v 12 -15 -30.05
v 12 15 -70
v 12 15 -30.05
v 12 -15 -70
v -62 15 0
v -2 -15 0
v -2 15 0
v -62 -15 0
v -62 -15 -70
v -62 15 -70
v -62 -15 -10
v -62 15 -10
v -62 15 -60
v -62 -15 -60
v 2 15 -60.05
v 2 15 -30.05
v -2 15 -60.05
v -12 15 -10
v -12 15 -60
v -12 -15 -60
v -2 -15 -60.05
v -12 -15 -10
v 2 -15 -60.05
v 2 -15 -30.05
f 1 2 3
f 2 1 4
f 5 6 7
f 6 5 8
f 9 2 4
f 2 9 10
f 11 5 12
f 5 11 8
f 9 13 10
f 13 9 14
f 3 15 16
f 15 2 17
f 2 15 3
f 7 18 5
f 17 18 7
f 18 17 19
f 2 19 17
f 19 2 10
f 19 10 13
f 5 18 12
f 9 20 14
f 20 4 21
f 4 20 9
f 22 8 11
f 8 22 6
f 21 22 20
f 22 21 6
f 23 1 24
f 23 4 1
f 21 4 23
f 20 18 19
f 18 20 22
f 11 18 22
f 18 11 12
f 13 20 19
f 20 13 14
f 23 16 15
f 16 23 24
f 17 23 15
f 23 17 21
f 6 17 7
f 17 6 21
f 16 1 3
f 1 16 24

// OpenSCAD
fragments = 300;
tol = 0.1;


// -------------------------------------------------------
// ----------------- Plexiglass holder - plant's cat guard
// -------------------------------------------------------
thickness_part = 10;
thickness_lack = 50;
thickness_plexiglass = 4;

let(){
    dx = 2 * thickness_part + thickness_lack + thickness_plexiglass;
    dy = 30; //(2 * thickness_part + thickness_lack) / 2;
    dz = 2 * thickness_part + thickness_lack;
    echo(dy);

    difference(){
        dist_end_to_plexiglas_center = -dx + thickness_part+thickness_plexiglass/2;
        translate([dist_end_to_plexiglas_center, 0, -dz/2])
        difference(){
            translate([dx/2, 0, 0])
            cube(size = [dx, dy, dz], center=true);
            cube(size = [2*thickness_lack, 2* thickness_lack, thickness_lack], center=true);
        }

        translate([0, 0, -(thickness_lack+thickness_part)/2])
        cube(size = [thickness_plexiglass, 2*thickness_lack, thickness_lack+thickness_part+tol], center=true);

        dist = (thickness_part+thickness_plexiglass)/2;
        translate([dist, 0, dz/2 - (dz-4*thickness_part)])
        cube(size = [thickness_part+tol, dy+tol, dz+tol], center=true);
    }
}


// // -------------------------------------------------------
// // ---------------------------- water transfer pipe holder
// // -------------------------------------------------------
// inner_diameter = 7;
// bend_radius = 10;
// bend_arc = 90;
// straight_length = 50;
// thickness = 2;

// module bend(){
//     difference(){
//         rotate_extrude(angle=bend_arc, convexity=10)
//         translate([bend_radius, 0, 0])
//         circle(r=(thickness+inner_diameter)/2, $fn=fragments);

//         rotate([0, 0, -1]) 
//         rotate_extrude(angle=bend_arc+2, convexity=10)
//         translate([bend_radius, 0, 0])
//         circle(r=inner_diameter/2, $fn=fragments);
//     }
// }
// module straight() {
//     difference(){
//         cylinder(h=straight_length, d=inner_diameter+thickness, center=true, $fn=fragments);
//         cylinder(h=straight_length+1, d=inner_diameter, center=true, $fn=fragments);

//     }    
// }

// difference(){
//     union() {
//         rotate([0, 90, 0])
//         straight();

//         translate([straight_length/2-tol, -bend_radius, 0])
//         rotate([0, 0, 90-bend_arc])
//         bend();

//         translate([-(straight_length/2-tol), -bend_radius, 0])
//         rotate([0, 0, 90])
//         bend();
//     }
//     cut_ratio = 1/5;
//     translate([0, 0, (2- cut_ratio)*inner_diameter/2])
//     cube([3*straight_length, 3*straight_length, inner_diameter], center=true);
// }

// translate([0, 0, 20]) 
// let(h = 2*thickness,
//     inner_d = inner_diameter-1,
//     outer_d = 3*inner_diameter)
// {
//     difference(){
//         cylinder(h =h, d=outer_d, $fn=fragments, center=true);
//         cylinder(h =h+tol, d=inner_d, $fn=fragments, center=true);
//     }
// }

// // -------------------------------------------------------
// // -------------------------------- guitar stand-extension
// // -------------------------------------------------------
// sleeve_height = 5;
// inner_diameter = 23;
// bottom_height = 1.5;
// thickness = 2;

// let(d = inner_diameter,
//     h = sleeve_height + bottom_height)
// {
//     difference()
//     {
//         translate([0, 0, h/2])
//         cylinder(h = h, d = d + 2* thickness, center = true, $fn=fragments);

//         cylinder(h = 10 * h, d = 0.7 * d, center = true, $fn=fragments);

//         translate([0, 0, h/2 + bottom_height])
//         cylinder(h = h, d = d, center = true, $fn=fragments);

//     }
// }

// -------------------------------------------------------
// -------------------------- stand for the woven triangle
// -------------------------------------------------------
// length = 40;
// width = 10;
// height = 7;
// gap_width = 16;
// thickness = 2;
// thread_diameter = 1.5;

// points = [
//     [length/2, 0],
//     [length/2, thickness],
//     [0, height],
//     [-length/2, thickness],
//     [-length/2, 0],
// ];

// let()
// {
//     difference(){
//         translate([0, width/2, 0])
//         rotate([90, 0, 0]) 
//         linear_extrude(height=width)
//         polygon(points);
    
//         translate([0, 0, height/2 + thickness])
//         cube([gap_width, width+tol, height], center=true);

//         translate([0, 0, thickness])
//         rotate([90, 0, 0])
//         cylinder(h=width+tol, d=thread_diameter, center=true, $fn=fragments);
//     }
// }

// -------------------------------------------------------
// -------------------------------- experiment with fillet
// -------------------------------------------------------
// module fillet(x, y, r) {
//     translate([x, y]) {
//         difference() {
//             union() {
//                 circle(r);
//                 translate([r, r]) square([width - 2*r, height - 2*r]);
//                 translate([width - 2*r, r]) circle(r);
//                 translate([r, height - 2*r]) circle(r);
//                 translate([width - 2*r, height - 2*r]) circle(r);
//             }
//             square([width, height]);
//         }
//     }
// }
// width = 40; // Width of the rectangle
// height = 20; // Height of the rectangle
// radius = 5; // Fillet radius
// fillet(0, 0, radius);


// -------------------------------------------------------
// --------------------------- pin to turn armature to top
// -------------------------------------------------------
// module center_pin(){
//     union(){
//         let(h=30, d=5){
//             translate([0, 0, +h/3])
//             cylinder(h=h, d=d, $fn=fragments, center=true);
//         }
//         let(h=10, d=5){
//             translate([0, 0, -h+tol])
//             cylinder(h=h, r1=0, r2=d/2, $fn=fragments, center=true);
//         }
//     }
// }
// module core_lock(){
//     union()
//     {
//         let(h=3, d=12.1){
//             translate([0, 0, +h/2])
//             cylinder(h=h, d=d, $fn=fragments, center=true);
//         }
//         let(h=6, d=10){
//             translate([0, 0, -h/2])
//             cylinder(h=h, d=d, $fn=fragments, center=true);
//         }
//         let(h=6, d=1.9, dx=5){
//             translate([0, dx, -h/2])
//             cylinder(h=h, d=d, $fn=fragments, center=true);
//         }
//     }
// }
// difference(){
//     core_lock();
//     center_pin();
// }
// translate([0, 0, 20])
// scale([0.97, 0.97, 1])
// center_pin();

// // -------------------------------------------------------
// // ------------------------------------ magnet cube holder
// // -------------------------------------------------------
// use <lib/extrude_directional.scad>
// thickness = 1;
// magnet_height = 2.7;
// magnet_diameter = 5;
// box_d = magnet_diameter + 2 * thickness;
// sphere_d = sqrt(magnet_diameter^2 + magnet_height^2) + 2 * thickness;

// module magnet()
// {
//     cylinder(h=magnet_height, d=magnet_diameter, $fn=fragments, center=true);
// }

// difference(){
//     cube([box_d, box_d, box_d], center=true);    
//     extrude_along_y(length=box_d)
//     magnet();

//     rotate([90, 0, 0])
//     cylinder(h=2*box_d, r=thickness, center=true, $fn=fragments);
// }
